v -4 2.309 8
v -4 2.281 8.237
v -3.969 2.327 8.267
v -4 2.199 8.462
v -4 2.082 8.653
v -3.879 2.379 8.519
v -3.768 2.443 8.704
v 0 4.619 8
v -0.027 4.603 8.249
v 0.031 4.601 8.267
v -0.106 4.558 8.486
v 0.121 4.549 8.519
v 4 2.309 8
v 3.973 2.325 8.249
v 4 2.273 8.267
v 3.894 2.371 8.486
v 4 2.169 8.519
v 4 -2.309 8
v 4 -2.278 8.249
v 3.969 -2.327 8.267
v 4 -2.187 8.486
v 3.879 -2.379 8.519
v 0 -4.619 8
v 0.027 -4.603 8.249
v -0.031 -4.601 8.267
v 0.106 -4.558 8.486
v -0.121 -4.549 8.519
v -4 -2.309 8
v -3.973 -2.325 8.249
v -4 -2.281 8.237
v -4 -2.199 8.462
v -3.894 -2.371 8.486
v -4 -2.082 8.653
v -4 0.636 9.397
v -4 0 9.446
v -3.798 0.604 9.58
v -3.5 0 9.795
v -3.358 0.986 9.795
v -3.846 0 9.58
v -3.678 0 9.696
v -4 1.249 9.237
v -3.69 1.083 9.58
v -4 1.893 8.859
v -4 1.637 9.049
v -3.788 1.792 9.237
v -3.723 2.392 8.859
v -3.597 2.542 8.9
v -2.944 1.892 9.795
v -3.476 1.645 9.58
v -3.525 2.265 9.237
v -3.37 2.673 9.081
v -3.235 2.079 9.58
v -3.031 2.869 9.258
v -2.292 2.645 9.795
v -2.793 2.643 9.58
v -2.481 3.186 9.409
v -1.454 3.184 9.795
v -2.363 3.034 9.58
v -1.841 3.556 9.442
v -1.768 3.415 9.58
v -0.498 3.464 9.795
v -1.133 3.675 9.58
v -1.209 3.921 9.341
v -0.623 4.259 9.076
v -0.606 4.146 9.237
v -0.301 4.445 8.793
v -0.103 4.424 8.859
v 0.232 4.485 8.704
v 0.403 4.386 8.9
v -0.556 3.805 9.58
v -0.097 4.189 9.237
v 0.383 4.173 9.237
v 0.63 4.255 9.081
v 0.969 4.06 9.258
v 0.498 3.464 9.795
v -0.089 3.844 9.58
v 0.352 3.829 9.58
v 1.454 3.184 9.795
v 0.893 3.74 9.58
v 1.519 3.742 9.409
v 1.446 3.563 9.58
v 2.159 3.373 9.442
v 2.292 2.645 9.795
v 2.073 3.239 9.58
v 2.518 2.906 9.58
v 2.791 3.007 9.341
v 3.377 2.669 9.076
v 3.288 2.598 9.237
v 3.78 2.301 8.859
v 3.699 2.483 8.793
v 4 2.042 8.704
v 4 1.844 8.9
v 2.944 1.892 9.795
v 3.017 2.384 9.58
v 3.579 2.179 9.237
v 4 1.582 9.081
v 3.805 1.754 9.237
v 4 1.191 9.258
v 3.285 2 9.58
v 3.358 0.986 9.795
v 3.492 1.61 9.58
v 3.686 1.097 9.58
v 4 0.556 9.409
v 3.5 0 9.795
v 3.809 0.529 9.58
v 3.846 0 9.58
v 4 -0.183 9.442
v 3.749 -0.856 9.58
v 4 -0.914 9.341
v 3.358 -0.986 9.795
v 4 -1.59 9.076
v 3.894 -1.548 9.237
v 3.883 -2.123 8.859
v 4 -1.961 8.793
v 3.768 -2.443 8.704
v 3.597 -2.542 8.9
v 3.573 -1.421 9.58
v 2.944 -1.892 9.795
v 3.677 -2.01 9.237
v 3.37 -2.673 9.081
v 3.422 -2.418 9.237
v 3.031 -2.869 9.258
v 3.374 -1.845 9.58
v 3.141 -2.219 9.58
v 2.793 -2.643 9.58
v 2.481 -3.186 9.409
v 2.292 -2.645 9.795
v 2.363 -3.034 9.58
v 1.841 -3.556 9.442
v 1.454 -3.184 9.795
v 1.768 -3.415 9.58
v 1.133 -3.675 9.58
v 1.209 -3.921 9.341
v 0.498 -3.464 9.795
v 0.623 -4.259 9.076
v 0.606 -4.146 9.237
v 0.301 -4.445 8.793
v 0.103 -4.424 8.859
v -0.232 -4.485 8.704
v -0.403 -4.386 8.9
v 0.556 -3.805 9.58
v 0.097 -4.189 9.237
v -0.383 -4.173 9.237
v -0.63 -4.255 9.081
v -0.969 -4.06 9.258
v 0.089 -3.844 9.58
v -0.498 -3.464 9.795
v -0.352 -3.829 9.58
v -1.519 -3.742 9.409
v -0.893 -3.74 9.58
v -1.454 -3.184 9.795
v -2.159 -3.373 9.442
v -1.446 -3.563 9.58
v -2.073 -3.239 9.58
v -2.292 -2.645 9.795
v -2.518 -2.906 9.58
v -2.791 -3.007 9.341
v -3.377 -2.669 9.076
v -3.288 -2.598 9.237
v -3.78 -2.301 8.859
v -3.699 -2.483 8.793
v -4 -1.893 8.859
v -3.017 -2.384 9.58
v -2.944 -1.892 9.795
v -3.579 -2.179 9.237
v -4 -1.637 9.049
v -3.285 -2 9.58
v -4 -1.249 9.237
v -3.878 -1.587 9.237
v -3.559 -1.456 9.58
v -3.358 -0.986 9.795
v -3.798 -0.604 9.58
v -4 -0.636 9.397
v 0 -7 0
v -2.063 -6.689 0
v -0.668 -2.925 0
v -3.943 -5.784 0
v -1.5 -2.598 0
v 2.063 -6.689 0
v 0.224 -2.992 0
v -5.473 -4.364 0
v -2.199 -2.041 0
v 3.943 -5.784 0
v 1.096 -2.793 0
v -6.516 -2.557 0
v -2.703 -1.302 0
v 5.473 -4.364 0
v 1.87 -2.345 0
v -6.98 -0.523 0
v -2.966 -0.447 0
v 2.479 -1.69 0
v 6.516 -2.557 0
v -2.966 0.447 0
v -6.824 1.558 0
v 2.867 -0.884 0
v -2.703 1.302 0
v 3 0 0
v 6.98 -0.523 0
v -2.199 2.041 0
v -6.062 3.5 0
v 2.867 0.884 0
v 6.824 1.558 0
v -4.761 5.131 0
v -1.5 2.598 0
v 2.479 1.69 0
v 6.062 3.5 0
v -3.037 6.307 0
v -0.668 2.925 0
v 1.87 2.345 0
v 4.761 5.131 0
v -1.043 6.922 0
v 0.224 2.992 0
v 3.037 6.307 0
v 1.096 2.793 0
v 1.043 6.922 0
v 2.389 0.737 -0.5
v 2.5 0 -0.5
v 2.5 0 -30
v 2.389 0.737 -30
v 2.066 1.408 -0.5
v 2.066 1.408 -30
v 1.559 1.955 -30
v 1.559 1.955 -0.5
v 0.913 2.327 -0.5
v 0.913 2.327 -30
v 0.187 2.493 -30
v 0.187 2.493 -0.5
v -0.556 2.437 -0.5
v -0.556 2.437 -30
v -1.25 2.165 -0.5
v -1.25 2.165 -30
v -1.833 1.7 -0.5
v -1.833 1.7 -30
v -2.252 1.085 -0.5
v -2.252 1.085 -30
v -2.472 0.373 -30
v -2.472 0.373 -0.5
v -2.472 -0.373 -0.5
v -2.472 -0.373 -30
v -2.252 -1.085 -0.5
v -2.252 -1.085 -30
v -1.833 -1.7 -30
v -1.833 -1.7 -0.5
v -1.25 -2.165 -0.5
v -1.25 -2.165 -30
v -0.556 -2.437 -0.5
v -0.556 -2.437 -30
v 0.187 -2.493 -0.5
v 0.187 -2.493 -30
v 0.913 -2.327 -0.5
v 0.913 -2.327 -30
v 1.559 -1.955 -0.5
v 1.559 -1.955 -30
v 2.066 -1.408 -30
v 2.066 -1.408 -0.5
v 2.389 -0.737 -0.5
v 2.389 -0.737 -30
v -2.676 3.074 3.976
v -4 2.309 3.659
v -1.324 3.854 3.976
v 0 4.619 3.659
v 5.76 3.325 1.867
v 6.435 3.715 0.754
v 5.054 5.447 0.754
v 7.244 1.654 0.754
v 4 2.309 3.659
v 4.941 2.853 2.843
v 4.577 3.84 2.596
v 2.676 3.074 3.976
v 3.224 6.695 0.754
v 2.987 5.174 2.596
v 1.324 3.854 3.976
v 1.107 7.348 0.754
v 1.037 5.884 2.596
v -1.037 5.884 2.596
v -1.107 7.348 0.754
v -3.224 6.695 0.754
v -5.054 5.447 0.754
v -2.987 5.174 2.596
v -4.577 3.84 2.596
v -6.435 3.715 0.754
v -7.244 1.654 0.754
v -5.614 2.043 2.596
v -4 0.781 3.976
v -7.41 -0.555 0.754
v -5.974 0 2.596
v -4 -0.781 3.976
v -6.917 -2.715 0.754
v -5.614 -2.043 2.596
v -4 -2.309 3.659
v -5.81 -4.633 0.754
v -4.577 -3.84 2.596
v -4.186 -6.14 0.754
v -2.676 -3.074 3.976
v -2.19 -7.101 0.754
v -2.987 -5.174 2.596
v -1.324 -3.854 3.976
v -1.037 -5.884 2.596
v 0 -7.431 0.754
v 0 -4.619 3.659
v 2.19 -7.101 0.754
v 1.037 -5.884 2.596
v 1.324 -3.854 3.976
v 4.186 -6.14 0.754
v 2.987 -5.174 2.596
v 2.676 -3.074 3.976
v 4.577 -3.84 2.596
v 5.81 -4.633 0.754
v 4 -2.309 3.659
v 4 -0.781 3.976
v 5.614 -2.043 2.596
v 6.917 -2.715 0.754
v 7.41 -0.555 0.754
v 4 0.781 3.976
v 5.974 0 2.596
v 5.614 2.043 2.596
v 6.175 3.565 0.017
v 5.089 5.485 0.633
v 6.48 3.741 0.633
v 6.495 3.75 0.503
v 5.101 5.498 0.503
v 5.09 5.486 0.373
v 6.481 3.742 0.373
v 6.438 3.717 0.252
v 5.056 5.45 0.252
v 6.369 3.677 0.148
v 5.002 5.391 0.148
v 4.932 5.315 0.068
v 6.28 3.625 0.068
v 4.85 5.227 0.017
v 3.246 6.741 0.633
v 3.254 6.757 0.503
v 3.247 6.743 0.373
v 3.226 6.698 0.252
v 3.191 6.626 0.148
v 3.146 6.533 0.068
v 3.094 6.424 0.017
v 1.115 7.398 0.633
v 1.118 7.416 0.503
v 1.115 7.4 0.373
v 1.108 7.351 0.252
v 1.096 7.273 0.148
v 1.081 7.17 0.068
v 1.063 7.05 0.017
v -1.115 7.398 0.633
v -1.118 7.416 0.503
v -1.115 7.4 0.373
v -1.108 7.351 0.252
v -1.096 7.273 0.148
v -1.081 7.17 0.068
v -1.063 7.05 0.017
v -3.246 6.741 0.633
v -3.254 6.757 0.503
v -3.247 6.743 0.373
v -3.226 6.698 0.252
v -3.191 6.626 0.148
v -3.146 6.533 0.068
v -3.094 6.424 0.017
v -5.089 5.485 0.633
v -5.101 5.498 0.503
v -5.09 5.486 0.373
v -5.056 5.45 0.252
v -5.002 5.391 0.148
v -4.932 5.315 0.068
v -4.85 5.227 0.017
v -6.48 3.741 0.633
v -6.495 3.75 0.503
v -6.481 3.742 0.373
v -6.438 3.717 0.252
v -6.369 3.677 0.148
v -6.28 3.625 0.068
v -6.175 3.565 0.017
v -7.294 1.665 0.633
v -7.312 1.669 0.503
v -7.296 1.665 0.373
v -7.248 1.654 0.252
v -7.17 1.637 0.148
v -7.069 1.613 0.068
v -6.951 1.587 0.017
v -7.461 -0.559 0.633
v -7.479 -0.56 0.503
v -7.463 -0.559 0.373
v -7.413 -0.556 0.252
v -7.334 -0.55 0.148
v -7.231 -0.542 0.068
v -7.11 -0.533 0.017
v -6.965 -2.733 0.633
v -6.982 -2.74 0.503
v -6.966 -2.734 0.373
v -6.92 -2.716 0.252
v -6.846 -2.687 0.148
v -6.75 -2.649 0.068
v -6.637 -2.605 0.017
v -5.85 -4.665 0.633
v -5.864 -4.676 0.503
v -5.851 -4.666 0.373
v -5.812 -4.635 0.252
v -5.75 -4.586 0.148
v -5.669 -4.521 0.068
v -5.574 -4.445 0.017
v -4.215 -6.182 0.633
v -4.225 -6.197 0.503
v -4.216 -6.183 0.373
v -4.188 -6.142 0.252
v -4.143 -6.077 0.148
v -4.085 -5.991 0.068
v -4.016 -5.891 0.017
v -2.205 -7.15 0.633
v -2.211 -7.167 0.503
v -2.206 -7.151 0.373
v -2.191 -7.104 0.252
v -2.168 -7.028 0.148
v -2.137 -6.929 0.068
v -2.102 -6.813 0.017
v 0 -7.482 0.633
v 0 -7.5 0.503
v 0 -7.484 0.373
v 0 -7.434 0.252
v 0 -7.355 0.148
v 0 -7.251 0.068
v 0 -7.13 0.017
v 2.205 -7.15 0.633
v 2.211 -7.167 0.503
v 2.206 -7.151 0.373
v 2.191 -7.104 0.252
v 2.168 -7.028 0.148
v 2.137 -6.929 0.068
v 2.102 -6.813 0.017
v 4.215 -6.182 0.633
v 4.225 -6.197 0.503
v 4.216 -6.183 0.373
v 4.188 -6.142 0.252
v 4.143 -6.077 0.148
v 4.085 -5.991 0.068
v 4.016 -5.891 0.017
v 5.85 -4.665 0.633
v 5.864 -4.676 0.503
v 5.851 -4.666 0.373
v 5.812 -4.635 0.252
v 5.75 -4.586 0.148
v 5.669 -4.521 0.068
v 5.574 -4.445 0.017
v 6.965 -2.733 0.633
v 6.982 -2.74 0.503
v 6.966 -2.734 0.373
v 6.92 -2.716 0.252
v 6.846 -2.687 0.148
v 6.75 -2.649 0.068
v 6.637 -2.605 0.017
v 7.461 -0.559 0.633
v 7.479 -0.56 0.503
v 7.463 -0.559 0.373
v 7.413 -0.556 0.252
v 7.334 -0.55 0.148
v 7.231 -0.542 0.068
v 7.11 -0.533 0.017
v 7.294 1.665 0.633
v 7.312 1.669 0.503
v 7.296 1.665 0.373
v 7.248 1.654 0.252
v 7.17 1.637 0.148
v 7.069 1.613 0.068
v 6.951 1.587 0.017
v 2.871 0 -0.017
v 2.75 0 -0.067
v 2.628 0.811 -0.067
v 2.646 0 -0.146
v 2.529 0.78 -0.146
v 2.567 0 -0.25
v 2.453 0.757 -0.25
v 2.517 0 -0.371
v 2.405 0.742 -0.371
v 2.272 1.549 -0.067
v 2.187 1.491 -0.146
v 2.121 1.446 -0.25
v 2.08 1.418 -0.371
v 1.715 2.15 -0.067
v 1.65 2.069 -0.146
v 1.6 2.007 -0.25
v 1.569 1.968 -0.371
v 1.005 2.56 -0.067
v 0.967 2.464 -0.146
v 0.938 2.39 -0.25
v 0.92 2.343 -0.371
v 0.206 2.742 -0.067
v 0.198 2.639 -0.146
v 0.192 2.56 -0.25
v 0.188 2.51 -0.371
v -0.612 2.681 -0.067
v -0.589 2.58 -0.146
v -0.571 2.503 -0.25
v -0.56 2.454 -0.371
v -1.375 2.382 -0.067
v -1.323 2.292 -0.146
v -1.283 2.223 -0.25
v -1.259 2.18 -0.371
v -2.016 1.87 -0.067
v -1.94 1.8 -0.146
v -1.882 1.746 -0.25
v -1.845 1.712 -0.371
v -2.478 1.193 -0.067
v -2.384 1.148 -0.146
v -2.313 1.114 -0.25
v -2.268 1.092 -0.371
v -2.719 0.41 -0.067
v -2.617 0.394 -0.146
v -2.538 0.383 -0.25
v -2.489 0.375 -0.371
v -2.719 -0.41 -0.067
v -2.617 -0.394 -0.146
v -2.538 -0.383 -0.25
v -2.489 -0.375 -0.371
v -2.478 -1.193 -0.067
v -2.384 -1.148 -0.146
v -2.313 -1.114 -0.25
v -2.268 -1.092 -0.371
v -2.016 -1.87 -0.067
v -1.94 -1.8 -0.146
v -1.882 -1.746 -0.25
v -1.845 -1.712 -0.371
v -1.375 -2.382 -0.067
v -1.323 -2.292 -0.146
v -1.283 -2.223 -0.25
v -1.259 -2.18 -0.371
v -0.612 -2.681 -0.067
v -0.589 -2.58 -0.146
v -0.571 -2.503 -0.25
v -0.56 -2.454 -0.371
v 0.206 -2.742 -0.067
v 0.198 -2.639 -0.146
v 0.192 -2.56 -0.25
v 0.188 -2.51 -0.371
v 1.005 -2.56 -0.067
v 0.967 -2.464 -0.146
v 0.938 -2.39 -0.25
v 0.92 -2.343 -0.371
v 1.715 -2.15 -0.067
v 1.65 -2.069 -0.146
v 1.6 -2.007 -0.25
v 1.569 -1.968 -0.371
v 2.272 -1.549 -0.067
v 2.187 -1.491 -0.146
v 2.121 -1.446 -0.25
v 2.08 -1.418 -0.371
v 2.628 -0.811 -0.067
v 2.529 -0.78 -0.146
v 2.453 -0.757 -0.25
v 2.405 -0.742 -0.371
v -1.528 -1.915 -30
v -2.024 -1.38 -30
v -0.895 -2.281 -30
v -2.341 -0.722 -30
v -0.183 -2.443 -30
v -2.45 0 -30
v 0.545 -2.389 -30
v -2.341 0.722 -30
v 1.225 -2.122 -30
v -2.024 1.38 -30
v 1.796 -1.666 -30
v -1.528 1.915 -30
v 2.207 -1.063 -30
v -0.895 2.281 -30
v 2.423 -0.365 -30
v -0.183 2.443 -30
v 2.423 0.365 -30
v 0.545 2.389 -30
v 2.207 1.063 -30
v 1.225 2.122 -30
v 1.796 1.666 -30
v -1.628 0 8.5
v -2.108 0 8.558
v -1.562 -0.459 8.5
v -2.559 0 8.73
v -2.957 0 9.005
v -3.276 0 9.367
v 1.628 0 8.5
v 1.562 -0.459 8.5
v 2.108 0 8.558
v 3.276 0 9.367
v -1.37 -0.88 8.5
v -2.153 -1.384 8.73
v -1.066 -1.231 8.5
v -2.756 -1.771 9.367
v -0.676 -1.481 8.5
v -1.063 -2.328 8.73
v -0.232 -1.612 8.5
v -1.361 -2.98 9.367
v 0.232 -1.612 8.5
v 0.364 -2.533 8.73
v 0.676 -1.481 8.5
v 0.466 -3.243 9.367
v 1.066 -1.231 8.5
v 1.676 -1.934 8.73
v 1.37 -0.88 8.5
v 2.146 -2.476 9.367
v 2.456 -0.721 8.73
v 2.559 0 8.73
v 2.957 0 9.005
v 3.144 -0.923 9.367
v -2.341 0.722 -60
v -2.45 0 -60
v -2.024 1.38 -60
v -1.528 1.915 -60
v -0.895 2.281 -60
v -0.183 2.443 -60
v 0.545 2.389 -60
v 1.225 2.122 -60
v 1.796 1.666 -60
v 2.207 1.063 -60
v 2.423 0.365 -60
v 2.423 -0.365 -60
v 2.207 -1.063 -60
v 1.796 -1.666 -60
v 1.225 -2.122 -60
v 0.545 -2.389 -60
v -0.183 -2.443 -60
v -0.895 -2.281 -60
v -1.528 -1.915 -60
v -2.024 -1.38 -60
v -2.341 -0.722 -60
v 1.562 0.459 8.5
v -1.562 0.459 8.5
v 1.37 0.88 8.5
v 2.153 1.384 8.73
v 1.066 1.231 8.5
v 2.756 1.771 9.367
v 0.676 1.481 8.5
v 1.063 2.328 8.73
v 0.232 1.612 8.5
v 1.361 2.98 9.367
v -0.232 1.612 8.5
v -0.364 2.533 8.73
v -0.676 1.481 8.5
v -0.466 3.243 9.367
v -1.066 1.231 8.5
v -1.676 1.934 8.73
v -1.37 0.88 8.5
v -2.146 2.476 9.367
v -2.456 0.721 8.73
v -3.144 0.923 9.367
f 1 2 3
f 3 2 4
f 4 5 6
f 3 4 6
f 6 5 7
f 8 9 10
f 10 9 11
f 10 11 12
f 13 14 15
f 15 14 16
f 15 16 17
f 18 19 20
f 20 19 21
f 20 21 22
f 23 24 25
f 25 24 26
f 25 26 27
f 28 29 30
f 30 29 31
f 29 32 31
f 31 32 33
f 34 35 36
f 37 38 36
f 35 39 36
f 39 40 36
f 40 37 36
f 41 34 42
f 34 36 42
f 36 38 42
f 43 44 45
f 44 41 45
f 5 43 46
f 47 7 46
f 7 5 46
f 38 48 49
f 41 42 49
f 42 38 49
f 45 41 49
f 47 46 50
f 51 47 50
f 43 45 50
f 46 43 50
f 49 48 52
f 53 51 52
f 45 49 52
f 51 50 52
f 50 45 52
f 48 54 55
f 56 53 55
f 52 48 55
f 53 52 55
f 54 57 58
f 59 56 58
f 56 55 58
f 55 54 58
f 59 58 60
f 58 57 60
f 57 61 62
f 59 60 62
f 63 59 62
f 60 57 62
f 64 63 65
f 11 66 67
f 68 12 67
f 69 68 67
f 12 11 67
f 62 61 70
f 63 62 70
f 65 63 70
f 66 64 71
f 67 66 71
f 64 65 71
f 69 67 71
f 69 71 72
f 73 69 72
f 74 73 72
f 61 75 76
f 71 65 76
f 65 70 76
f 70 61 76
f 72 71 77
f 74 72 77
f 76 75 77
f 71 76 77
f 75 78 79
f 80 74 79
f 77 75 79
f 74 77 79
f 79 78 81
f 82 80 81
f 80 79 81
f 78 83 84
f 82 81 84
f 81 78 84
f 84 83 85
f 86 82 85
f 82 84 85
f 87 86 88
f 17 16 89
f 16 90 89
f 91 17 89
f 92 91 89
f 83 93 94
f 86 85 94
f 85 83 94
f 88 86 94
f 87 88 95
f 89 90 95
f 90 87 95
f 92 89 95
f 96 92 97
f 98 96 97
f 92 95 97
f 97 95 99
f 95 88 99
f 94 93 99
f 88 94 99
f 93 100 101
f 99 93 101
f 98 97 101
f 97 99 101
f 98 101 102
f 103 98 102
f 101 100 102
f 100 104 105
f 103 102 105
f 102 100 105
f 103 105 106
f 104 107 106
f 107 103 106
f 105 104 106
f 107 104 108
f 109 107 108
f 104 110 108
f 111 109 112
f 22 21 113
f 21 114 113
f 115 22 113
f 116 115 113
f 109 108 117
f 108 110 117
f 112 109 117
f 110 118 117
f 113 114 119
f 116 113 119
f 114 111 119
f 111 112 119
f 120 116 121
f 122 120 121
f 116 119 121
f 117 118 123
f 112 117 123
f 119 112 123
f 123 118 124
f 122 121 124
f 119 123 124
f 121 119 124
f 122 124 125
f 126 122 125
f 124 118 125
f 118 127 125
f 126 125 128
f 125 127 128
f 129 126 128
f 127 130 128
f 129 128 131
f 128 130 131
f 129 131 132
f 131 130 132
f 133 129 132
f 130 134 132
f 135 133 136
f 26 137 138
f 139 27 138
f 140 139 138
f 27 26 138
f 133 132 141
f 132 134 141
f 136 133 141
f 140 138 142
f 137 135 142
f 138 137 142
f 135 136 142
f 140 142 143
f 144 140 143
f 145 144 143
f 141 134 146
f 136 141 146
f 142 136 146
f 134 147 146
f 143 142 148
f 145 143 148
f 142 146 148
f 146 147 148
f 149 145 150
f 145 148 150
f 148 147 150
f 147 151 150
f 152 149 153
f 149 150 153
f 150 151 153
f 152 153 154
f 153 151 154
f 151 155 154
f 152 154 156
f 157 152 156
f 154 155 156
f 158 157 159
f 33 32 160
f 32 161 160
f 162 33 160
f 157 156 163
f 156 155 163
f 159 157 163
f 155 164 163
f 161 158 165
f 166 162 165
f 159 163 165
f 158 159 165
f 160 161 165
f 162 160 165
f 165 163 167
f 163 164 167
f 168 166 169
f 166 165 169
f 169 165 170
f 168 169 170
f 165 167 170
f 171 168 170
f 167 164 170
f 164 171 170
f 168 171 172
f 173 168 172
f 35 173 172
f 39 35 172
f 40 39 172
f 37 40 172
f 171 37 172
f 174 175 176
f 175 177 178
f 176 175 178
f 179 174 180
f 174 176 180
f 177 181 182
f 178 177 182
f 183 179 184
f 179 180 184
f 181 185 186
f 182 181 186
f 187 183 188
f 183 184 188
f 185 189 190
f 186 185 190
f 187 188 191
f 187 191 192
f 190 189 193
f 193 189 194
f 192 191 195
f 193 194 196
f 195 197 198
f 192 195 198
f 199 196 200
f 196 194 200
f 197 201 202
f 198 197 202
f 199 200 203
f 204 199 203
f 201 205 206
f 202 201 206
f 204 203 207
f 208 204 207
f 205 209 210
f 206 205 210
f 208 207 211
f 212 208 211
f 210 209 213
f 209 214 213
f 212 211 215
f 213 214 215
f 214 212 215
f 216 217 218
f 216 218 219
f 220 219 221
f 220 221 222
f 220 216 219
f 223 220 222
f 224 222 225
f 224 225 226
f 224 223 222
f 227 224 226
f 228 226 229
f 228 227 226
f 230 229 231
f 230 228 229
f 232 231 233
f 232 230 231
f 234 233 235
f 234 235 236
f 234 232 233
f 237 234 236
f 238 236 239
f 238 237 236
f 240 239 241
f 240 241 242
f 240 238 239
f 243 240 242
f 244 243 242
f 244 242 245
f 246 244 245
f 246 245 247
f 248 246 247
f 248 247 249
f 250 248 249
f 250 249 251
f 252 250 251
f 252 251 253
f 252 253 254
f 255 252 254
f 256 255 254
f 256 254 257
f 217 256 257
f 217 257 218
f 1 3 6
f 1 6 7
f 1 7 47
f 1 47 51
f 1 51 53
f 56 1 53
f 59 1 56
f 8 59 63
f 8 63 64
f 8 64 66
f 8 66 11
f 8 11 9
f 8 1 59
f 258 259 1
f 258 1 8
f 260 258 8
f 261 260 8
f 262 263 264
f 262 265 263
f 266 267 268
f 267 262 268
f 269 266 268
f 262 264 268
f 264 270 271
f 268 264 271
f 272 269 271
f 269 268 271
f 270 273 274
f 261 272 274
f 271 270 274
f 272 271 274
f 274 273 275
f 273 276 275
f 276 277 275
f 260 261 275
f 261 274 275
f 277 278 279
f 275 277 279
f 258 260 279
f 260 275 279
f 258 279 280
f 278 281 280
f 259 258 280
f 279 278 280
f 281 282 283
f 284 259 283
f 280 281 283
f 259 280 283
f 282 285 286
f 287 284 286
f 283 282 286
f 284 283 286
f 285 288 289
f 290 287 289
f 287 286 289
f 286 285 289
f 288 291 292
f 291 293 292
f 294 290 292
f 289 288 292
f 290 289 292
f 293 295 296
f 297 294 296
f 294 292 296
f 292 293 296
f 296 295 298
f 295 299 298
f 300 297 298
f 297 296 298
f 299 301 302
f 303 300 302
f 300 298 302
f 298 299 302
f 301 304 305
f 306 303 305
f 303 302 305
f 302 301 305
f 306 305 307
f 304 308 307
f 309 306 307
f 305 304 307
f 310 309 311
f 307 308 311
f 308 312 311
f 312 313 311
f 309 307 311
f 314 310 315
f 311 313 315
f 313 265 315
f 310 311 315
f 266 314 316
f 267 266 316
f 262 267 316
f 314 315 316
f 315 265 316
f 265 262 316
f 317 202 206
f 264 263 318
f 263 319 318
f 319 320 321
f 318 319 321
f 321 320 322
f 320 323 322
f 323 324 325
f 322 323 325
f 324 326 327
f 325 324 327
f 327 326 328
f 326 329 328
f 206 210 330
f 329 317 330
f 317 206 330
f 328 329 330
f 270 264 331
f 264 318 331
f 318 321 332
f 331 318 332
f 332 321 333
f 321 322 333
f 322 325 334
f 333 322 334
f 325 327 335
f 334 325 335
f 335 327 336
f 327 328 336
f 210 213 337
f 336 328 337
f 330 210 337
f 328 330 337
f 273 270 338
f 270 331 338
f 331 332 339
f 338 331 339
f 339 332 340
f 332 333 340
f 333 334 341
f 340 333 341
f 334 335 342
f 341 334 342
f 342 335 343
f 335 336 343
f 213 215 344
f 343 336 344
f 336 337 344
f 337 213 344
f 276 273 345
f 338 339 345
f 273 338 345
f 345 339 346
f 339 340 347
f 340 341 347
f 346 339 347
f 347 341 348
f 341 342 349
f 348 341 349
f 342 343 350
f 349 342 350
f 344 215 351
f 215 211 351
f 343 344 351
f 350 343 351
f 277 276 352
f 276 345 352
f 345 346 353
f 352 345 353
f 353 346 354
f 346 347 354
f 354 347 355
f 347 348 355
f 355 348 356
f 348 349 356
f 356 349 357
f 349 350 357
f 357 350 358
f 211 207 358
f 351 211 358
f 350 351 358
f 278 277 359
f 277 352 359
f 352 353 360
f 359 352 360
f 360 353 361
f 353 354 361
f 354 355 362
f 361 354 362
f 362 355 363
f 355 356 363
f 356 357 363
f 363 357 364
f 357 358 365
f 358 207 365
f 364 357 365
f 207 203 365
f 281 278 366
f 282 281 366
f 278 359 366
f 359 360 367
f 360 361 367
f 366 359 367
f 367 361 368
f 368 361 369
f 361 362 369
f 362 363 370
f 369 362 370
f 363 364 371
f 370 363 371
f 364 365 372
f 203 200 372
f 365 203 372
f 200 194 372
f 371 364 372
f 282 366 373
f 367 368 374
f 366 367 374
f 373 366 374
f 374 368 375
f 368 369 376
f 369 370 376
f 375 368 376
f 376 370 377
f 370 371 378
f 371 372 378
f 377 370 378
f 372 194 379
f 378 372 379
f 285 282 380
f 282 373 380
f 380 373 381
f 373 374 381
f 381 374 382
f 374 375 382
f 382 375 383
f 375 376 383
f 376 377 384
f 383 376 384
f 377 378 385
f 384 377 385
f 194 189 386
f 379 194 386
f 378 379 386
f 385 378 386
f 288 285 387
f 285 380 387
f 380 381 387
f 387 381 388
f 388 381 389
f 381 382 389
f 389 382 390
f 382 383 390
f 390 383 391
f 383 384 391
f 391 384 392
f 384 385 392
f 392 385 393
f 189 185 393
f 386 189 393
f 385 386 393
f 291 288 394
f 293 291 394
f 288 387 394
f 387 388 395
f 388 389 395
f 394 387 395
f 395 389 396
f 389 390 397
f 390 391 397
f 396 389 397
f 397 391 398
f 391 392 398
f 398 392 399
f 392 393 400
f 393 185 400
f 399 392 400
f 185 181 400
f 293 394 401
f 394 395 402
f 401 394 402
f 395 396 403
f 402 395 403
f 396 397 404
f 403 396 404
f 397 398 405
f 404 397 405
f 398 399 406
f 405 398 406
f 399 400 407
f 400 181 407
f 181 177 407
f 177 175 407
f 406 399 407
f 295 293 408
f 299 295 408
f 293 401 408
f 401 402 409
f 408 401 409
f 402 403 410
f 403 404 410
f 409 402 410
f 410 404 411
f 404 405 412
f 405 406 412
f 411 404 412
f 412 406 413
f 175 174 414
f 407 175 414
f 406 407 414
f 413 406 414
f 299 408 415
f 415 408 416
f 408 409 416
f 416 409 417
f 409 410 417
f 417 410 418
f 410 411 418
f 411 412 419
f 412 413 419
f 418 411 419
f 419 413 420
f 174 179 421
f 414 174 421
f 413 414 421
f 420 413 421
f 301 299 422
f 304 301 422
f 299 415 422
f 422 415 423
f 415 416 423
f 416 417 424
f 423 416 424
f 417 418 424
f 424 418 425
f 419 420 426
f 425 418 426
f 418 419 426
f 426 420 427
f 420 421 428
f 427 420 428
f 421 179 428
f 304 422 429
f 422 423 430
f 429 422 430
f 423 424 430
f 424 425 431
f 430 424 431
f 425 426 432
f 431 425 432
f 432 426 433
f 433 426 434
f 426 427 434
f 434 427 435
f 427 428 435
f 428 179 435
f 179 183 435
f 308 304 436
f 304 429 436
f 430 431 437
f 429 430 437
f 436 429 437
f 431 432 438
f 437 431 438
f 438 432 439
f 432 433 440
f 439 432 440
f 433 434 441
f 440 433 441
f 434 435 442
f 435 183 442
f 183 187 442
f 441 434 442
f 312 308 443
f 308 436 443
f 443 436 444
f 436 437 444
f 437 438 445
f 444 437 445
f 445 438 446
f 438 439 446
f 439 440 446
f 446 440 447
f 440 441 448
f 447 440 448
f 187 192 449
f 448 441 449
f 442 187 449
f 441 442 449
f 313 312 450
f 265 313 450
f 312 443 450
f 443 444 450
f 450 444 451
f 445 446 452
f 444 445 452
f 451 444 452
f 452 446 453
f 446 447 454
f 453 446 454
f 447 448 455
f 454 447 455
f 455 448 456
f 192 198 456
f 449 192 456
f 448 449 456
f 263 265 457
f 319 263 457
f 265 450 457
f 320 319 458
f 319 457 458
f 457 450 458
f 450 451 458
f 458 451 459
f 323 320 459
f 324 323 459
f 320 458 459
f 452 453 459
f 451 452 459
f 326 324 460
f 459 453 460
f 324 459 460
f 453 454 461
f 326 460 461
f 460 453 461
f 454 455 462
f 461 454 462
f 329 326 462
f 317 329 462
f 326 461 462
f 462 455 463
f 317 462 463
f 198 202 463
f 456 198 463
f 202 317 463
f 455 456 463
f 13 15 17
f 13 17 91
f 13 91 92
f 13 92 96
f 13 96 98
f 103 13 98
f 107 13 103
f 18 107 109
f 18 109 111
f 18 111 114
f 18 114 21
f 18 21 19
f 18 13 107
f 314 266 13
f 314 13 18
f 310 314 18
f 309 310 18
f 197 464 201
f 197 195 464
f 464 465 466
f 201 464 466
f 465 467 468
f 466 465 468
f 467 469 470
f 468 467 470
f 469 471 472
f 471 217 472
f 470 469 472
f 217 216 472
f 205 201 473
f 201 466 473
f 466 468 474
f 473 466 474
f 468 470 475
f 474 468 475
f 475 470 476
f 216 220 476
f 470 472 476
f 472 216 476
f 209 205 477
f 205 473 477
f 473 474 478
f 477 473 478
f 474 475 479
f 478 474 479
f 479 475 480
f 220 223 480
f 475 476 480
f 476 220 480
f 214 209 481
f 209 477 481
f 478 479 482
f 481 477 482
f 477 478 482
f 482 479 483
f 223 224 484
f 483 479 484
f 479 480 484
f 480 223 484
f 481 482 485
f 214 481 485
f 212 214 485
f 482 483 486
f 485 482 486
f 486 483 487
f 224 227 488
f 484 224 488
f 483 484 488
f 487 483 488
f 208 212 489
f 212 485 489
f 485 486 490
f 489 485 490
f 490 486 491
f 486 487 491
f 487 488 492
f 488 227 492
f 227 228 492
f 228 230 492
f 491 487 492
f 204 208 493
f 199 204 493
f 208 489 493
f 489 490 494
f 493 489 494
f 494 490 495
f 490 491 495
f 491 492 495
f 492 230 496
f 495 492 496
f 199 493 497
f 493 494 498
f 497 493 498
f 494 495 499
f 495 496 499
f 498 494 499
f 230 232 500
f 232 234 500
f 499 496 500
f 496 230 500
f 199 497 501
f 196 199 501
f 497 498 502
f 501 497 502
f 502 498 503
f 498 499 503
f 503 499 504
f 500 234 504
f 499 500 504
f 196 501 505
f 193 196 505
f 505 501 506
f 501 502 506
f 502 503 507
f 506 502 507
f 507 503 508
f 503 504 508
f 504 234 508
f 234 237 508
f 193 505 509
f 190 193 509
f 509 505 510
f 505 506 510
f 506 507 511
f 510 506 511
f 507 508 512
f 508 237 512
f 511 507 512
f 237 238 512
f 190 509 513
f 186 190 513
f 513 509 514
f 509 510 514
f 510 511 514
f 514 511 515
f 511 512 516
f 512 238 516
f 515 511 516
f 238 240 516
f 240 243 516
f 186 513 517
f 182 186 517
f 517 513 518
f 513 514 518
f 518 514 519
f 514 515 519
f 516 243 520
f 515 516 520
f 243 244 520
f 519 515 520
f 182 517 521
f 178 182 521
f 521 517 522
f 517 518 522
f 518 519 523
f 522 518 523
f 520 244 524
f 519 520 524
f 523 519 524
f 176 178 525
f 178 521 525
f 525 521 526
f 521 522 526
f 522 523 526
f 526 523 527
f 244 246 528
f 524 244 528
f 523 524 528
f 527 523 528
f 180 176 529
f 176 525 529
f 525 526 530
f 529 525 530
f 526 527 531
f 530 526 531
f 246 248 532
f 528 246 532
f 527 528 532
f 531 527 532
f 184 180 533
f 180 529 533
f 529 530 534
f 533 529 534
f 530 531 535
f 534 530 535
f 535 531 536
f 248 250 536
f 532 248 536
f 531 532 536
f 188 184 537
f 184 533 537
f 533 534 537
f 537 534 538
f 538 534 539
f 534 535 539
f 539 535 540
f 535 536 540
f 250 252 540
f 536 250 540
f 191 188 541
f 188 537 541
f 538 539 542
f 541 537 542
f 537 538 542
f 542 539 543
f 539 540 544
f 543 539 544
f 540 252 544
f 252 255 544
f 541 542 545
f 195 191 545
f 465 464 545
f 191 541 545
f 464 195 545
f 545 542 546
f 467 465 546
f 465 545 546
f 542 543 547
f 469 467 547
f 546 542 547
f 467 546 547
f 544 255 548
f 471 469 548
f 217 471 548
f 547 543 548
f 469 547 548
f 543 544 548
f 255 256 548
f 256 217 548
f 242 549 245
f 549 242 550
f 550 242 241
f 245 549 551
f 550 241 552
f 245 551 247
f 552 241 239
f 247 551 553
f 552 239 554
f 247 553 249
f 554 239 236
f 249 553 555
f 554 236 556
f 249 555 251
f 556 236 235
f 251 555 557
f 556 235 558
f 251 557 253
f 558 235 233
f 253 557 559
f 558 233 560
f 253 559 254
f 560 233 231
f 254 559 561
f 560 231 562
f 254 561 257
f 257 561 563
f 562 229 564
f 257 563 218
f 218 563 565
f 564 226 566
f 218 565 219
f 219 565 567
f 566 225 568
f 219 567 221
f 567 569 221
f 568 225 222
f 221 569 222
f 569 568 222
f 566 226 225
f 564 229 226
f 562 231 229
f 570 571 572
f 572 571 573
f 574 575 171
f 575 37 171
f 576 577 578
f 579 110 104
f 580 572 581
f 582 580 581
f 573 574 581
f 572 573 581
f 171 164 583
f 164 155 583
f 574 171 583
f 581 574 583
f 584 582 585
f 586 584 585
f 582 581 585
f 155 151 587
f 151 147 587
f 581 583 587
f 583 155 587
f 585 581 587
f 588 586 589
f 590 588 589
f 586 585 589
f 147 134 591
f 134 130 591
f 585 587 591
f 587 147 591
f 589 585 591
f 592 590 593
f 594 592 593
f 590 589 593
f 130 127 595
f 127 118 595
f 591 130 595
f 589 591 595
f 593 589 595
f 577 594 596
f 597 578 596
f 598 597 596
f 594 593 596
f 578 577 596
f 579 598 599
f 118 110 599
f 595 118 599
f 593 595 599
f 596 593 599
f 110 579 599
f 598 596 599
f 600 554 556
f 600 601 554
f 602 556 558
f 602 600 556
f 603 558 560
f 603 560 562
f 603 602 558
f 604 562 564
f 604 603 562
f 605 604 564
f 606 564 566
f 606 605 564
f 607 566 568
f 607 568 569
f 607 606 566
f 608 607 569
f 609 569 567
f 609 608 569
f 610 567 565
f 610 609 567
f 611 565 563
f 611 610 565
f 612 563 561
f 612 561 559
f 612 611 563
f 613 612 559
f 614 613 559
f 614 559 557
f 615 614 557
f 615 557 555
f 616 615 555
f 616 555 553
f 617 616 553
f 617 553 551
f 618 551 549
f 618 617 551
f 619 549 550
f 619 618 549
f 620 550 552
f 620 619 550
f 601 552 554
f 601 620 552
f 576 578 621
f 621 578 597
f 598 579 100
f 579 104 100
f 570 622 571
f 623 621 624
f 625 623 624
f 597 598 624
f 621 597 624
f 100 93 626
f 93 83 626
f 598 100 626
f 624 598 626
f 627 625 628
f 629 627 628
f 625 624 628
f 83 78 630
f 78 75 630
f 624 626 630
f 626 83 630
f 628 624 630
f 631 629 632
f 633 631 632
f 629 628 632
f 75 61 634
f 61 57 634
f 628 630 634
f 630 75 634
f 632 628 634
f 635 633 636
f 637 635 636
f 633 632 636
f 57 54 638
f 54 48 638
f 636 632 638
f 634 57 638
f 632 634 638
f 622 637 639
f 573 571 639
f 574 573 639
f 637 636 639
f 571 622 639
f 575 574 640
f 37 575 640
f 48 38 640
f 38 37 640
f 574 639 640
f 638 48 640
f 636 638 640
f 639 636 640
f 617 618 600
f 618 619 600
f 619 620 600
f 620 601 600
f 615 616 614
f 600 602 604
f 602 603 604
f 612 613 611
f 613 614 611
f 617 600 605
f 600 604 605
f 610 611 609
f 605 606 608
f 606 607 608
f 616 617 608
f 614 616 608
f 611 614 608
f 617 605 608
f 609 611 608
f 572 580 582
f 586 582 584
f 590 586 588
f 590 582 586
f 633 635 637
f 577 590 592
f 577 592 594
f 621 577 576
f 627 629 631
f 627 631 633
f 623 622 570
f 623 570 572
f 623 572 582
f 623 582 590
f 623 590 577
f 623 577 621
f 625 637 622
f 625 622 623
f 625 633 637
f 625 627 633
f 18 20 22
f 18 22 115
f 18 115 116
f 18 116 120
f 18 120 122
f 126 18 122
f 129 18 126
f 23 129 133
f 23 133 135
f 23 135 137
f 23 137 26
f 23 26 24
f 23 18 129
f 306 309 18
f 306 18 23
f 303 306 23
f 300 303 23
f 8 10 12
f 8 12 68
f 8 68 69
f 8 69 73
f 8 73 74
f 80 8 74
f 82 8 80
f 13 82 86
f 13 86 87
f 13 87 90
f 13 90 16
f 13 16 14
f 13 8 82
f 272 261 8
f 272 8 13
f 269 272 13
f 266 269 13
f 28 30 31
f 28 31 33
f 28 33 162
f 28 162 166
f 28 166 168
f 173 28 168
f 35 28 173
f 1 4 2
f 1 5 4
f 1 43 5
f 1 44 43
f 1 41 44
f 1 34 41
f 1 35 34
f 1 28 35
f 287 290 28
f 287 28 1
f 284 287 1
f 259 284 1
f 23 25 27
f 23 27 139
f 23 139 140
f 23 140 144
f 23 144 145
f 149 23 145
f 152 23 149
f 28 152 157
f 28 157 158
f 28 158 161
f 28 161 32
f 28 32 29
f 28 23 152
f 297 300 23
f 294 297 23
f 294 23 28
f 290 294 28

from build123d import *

# Parameters (mm, degrees)
HEAD_DEPTH     = 10
SHANK_SKETCH_R = 2.5
SHANK_DEPTH    = 60
SKETCH6_R      = 3.5
HEAD_CUT_DEPTH = 1.5
FILLET1_R      = 2
FILLET2_R      = 0.5
THREAD_END_W   = 30
THREAD_END_H   = 0.05


with BuildPart() as part:
    # Head Sketch → Head (new body)
    with BuildSketch(Plane.XY):
        Polygon((0, 4.618802154), (4, 2.309401077), (4, -2.309401077), (0, -4.618802154), (-4, -2.309401077), (-4, 2.309401077), align=None)
    extrude(amount=HEAD_DEPTH)

    # Shank Sketch → Shank (add)
    with BuildSketch(Plane.XY):
        Circle(SHANK_SKETCH_R)
    extrude(amount=-SHANK_DEPTH)

    # Sketch3 → Flange (revolve)
    with BuildSketch(Plane(origin=(0, 0, 0), x_dir=(-1, 0, 0), z_dir=(0, 1, 0)), mode=Mode.PRIVATE) as flange_sk:
        with BuildLine():
            Line((-7, 0), (0, 0))
            Line((0, 0), (0, 5))
            ThreePointArc((0, 5), (-4.279198343, 3.863597101), (-7.430769231, 0.753846154))
            ThreePointArc((-7.430769231, 0.753846154), (-7.434121571, 0.251930531), (-7, 0))
        make_face()
    revolve(flange_sk.sketch.rotate(Axis((0, 0, 0), (0, 0, 1)), 30), axis=Axis((0, 0, 0), (0, 0, 1)))

    # Sketch5 → Head Trim (revolve, cut)
    with BuildSketch(Plane(origin=(0, 0, 0), x_dir=(0, 0, -1), z_dir=(1, 0, 0)), mode=Mode.PRIVATE) as head_trim_sk:
        with BuildLine():
            Line((-10, -2.618802154), (-10, -4.618802154))
            Line((-10, -4.618802154), (-8, -4.618802154))
            ThreePointArc((-8, -4.618802154), (-9.414213562, -4.033015716), (-10, -2.618802154))
        make_face()
    revolve(head_trim_sk.sketch.rotate(Axis((0, 0, 15.085599173), (0, 0, -1)), 90), axis=Axis((0, 0, 15.085599173), (0, 0, -1)), mode=Mode.SUBTRACT)

    # Sketch6 → Head Cut (cut)
    with BuildSketch(Plane.XY.offset(10)):
        Circle(SKETCH6_R)
    extrude(amount=-HEAD_CUT_DEPTH, mode=Mode.SUBTRACT)

    # Fillet1
    # the kernel refuses this fillet: 2 mm, written as the material it adds along each edge
    with BuildSketch(Plane(origin=(0, 0, 8.5), x_dir=(1, 0, 0), z_dir=(0, -1, 0))) as fillet1_piece_1:
        with BuildLine():
            CenterArc((1.62822269, 2), FILLET1_R, 270, 69.372190804)
            Line((1.62822269, 0), (3.5, 0))
            Line((3.5, 0), (3.5, 1.295408131))
        make_face()
    revolve(axis=Axis((0, 0, 8.5), (0, 0, 1)), revolution_arc=180.000001341)
    with BuildSketch(Plane(origin=(0, 0, 8.5), x_dir=(-0.9999999999999998, -2.340668935307113e-08, 0), z_dir=(-2.340668935307113e-08, 0.9999999999999998, 0))) as fillet1_piece_2:
        with BuildLine():
            CenterArc((1.62822269, 2), FILLET1_R, 270, 69.372190804)
            Line((1.62822269, 0), (3.5, 0))
            Line((3.5, 0), (3.5, 1.295408131))
        make_face()
    revolve(axis=Axis((0, 0, 8.5), (0, 0, 1)), revolution_arc=179.999998659)

    # Fillet2
    fillet2_edges = [part.edges().sort_by_distance(p)[0] for p in [
        (-2.5, 0, 0),
    ]]
    fillet(fillet2_edges, radius=FILLET2_R)

    # Thread End → Thread Cut (revolve, cut)
    with BuildSketch(Plane(origin=(0, 0, 0), x_dir=(0, 0, -1), z_dir=(1, 0, 0)), mode=Mode.PRIVATE) as thread_cut_sk:
        with Locations((45, 2.475)):
            Rectangle(THREAD_END_W, THREAD_END_H)
    revolve(thread_cut_sk.sketch.rotate(Axis((0, 0, -21.551935625), (0, 0, -1)), 270), axis=Axis((0, 0, -21.551935625), (0, 0, -1)), mode=Mode.SUBTRACT)


solid = part.part
